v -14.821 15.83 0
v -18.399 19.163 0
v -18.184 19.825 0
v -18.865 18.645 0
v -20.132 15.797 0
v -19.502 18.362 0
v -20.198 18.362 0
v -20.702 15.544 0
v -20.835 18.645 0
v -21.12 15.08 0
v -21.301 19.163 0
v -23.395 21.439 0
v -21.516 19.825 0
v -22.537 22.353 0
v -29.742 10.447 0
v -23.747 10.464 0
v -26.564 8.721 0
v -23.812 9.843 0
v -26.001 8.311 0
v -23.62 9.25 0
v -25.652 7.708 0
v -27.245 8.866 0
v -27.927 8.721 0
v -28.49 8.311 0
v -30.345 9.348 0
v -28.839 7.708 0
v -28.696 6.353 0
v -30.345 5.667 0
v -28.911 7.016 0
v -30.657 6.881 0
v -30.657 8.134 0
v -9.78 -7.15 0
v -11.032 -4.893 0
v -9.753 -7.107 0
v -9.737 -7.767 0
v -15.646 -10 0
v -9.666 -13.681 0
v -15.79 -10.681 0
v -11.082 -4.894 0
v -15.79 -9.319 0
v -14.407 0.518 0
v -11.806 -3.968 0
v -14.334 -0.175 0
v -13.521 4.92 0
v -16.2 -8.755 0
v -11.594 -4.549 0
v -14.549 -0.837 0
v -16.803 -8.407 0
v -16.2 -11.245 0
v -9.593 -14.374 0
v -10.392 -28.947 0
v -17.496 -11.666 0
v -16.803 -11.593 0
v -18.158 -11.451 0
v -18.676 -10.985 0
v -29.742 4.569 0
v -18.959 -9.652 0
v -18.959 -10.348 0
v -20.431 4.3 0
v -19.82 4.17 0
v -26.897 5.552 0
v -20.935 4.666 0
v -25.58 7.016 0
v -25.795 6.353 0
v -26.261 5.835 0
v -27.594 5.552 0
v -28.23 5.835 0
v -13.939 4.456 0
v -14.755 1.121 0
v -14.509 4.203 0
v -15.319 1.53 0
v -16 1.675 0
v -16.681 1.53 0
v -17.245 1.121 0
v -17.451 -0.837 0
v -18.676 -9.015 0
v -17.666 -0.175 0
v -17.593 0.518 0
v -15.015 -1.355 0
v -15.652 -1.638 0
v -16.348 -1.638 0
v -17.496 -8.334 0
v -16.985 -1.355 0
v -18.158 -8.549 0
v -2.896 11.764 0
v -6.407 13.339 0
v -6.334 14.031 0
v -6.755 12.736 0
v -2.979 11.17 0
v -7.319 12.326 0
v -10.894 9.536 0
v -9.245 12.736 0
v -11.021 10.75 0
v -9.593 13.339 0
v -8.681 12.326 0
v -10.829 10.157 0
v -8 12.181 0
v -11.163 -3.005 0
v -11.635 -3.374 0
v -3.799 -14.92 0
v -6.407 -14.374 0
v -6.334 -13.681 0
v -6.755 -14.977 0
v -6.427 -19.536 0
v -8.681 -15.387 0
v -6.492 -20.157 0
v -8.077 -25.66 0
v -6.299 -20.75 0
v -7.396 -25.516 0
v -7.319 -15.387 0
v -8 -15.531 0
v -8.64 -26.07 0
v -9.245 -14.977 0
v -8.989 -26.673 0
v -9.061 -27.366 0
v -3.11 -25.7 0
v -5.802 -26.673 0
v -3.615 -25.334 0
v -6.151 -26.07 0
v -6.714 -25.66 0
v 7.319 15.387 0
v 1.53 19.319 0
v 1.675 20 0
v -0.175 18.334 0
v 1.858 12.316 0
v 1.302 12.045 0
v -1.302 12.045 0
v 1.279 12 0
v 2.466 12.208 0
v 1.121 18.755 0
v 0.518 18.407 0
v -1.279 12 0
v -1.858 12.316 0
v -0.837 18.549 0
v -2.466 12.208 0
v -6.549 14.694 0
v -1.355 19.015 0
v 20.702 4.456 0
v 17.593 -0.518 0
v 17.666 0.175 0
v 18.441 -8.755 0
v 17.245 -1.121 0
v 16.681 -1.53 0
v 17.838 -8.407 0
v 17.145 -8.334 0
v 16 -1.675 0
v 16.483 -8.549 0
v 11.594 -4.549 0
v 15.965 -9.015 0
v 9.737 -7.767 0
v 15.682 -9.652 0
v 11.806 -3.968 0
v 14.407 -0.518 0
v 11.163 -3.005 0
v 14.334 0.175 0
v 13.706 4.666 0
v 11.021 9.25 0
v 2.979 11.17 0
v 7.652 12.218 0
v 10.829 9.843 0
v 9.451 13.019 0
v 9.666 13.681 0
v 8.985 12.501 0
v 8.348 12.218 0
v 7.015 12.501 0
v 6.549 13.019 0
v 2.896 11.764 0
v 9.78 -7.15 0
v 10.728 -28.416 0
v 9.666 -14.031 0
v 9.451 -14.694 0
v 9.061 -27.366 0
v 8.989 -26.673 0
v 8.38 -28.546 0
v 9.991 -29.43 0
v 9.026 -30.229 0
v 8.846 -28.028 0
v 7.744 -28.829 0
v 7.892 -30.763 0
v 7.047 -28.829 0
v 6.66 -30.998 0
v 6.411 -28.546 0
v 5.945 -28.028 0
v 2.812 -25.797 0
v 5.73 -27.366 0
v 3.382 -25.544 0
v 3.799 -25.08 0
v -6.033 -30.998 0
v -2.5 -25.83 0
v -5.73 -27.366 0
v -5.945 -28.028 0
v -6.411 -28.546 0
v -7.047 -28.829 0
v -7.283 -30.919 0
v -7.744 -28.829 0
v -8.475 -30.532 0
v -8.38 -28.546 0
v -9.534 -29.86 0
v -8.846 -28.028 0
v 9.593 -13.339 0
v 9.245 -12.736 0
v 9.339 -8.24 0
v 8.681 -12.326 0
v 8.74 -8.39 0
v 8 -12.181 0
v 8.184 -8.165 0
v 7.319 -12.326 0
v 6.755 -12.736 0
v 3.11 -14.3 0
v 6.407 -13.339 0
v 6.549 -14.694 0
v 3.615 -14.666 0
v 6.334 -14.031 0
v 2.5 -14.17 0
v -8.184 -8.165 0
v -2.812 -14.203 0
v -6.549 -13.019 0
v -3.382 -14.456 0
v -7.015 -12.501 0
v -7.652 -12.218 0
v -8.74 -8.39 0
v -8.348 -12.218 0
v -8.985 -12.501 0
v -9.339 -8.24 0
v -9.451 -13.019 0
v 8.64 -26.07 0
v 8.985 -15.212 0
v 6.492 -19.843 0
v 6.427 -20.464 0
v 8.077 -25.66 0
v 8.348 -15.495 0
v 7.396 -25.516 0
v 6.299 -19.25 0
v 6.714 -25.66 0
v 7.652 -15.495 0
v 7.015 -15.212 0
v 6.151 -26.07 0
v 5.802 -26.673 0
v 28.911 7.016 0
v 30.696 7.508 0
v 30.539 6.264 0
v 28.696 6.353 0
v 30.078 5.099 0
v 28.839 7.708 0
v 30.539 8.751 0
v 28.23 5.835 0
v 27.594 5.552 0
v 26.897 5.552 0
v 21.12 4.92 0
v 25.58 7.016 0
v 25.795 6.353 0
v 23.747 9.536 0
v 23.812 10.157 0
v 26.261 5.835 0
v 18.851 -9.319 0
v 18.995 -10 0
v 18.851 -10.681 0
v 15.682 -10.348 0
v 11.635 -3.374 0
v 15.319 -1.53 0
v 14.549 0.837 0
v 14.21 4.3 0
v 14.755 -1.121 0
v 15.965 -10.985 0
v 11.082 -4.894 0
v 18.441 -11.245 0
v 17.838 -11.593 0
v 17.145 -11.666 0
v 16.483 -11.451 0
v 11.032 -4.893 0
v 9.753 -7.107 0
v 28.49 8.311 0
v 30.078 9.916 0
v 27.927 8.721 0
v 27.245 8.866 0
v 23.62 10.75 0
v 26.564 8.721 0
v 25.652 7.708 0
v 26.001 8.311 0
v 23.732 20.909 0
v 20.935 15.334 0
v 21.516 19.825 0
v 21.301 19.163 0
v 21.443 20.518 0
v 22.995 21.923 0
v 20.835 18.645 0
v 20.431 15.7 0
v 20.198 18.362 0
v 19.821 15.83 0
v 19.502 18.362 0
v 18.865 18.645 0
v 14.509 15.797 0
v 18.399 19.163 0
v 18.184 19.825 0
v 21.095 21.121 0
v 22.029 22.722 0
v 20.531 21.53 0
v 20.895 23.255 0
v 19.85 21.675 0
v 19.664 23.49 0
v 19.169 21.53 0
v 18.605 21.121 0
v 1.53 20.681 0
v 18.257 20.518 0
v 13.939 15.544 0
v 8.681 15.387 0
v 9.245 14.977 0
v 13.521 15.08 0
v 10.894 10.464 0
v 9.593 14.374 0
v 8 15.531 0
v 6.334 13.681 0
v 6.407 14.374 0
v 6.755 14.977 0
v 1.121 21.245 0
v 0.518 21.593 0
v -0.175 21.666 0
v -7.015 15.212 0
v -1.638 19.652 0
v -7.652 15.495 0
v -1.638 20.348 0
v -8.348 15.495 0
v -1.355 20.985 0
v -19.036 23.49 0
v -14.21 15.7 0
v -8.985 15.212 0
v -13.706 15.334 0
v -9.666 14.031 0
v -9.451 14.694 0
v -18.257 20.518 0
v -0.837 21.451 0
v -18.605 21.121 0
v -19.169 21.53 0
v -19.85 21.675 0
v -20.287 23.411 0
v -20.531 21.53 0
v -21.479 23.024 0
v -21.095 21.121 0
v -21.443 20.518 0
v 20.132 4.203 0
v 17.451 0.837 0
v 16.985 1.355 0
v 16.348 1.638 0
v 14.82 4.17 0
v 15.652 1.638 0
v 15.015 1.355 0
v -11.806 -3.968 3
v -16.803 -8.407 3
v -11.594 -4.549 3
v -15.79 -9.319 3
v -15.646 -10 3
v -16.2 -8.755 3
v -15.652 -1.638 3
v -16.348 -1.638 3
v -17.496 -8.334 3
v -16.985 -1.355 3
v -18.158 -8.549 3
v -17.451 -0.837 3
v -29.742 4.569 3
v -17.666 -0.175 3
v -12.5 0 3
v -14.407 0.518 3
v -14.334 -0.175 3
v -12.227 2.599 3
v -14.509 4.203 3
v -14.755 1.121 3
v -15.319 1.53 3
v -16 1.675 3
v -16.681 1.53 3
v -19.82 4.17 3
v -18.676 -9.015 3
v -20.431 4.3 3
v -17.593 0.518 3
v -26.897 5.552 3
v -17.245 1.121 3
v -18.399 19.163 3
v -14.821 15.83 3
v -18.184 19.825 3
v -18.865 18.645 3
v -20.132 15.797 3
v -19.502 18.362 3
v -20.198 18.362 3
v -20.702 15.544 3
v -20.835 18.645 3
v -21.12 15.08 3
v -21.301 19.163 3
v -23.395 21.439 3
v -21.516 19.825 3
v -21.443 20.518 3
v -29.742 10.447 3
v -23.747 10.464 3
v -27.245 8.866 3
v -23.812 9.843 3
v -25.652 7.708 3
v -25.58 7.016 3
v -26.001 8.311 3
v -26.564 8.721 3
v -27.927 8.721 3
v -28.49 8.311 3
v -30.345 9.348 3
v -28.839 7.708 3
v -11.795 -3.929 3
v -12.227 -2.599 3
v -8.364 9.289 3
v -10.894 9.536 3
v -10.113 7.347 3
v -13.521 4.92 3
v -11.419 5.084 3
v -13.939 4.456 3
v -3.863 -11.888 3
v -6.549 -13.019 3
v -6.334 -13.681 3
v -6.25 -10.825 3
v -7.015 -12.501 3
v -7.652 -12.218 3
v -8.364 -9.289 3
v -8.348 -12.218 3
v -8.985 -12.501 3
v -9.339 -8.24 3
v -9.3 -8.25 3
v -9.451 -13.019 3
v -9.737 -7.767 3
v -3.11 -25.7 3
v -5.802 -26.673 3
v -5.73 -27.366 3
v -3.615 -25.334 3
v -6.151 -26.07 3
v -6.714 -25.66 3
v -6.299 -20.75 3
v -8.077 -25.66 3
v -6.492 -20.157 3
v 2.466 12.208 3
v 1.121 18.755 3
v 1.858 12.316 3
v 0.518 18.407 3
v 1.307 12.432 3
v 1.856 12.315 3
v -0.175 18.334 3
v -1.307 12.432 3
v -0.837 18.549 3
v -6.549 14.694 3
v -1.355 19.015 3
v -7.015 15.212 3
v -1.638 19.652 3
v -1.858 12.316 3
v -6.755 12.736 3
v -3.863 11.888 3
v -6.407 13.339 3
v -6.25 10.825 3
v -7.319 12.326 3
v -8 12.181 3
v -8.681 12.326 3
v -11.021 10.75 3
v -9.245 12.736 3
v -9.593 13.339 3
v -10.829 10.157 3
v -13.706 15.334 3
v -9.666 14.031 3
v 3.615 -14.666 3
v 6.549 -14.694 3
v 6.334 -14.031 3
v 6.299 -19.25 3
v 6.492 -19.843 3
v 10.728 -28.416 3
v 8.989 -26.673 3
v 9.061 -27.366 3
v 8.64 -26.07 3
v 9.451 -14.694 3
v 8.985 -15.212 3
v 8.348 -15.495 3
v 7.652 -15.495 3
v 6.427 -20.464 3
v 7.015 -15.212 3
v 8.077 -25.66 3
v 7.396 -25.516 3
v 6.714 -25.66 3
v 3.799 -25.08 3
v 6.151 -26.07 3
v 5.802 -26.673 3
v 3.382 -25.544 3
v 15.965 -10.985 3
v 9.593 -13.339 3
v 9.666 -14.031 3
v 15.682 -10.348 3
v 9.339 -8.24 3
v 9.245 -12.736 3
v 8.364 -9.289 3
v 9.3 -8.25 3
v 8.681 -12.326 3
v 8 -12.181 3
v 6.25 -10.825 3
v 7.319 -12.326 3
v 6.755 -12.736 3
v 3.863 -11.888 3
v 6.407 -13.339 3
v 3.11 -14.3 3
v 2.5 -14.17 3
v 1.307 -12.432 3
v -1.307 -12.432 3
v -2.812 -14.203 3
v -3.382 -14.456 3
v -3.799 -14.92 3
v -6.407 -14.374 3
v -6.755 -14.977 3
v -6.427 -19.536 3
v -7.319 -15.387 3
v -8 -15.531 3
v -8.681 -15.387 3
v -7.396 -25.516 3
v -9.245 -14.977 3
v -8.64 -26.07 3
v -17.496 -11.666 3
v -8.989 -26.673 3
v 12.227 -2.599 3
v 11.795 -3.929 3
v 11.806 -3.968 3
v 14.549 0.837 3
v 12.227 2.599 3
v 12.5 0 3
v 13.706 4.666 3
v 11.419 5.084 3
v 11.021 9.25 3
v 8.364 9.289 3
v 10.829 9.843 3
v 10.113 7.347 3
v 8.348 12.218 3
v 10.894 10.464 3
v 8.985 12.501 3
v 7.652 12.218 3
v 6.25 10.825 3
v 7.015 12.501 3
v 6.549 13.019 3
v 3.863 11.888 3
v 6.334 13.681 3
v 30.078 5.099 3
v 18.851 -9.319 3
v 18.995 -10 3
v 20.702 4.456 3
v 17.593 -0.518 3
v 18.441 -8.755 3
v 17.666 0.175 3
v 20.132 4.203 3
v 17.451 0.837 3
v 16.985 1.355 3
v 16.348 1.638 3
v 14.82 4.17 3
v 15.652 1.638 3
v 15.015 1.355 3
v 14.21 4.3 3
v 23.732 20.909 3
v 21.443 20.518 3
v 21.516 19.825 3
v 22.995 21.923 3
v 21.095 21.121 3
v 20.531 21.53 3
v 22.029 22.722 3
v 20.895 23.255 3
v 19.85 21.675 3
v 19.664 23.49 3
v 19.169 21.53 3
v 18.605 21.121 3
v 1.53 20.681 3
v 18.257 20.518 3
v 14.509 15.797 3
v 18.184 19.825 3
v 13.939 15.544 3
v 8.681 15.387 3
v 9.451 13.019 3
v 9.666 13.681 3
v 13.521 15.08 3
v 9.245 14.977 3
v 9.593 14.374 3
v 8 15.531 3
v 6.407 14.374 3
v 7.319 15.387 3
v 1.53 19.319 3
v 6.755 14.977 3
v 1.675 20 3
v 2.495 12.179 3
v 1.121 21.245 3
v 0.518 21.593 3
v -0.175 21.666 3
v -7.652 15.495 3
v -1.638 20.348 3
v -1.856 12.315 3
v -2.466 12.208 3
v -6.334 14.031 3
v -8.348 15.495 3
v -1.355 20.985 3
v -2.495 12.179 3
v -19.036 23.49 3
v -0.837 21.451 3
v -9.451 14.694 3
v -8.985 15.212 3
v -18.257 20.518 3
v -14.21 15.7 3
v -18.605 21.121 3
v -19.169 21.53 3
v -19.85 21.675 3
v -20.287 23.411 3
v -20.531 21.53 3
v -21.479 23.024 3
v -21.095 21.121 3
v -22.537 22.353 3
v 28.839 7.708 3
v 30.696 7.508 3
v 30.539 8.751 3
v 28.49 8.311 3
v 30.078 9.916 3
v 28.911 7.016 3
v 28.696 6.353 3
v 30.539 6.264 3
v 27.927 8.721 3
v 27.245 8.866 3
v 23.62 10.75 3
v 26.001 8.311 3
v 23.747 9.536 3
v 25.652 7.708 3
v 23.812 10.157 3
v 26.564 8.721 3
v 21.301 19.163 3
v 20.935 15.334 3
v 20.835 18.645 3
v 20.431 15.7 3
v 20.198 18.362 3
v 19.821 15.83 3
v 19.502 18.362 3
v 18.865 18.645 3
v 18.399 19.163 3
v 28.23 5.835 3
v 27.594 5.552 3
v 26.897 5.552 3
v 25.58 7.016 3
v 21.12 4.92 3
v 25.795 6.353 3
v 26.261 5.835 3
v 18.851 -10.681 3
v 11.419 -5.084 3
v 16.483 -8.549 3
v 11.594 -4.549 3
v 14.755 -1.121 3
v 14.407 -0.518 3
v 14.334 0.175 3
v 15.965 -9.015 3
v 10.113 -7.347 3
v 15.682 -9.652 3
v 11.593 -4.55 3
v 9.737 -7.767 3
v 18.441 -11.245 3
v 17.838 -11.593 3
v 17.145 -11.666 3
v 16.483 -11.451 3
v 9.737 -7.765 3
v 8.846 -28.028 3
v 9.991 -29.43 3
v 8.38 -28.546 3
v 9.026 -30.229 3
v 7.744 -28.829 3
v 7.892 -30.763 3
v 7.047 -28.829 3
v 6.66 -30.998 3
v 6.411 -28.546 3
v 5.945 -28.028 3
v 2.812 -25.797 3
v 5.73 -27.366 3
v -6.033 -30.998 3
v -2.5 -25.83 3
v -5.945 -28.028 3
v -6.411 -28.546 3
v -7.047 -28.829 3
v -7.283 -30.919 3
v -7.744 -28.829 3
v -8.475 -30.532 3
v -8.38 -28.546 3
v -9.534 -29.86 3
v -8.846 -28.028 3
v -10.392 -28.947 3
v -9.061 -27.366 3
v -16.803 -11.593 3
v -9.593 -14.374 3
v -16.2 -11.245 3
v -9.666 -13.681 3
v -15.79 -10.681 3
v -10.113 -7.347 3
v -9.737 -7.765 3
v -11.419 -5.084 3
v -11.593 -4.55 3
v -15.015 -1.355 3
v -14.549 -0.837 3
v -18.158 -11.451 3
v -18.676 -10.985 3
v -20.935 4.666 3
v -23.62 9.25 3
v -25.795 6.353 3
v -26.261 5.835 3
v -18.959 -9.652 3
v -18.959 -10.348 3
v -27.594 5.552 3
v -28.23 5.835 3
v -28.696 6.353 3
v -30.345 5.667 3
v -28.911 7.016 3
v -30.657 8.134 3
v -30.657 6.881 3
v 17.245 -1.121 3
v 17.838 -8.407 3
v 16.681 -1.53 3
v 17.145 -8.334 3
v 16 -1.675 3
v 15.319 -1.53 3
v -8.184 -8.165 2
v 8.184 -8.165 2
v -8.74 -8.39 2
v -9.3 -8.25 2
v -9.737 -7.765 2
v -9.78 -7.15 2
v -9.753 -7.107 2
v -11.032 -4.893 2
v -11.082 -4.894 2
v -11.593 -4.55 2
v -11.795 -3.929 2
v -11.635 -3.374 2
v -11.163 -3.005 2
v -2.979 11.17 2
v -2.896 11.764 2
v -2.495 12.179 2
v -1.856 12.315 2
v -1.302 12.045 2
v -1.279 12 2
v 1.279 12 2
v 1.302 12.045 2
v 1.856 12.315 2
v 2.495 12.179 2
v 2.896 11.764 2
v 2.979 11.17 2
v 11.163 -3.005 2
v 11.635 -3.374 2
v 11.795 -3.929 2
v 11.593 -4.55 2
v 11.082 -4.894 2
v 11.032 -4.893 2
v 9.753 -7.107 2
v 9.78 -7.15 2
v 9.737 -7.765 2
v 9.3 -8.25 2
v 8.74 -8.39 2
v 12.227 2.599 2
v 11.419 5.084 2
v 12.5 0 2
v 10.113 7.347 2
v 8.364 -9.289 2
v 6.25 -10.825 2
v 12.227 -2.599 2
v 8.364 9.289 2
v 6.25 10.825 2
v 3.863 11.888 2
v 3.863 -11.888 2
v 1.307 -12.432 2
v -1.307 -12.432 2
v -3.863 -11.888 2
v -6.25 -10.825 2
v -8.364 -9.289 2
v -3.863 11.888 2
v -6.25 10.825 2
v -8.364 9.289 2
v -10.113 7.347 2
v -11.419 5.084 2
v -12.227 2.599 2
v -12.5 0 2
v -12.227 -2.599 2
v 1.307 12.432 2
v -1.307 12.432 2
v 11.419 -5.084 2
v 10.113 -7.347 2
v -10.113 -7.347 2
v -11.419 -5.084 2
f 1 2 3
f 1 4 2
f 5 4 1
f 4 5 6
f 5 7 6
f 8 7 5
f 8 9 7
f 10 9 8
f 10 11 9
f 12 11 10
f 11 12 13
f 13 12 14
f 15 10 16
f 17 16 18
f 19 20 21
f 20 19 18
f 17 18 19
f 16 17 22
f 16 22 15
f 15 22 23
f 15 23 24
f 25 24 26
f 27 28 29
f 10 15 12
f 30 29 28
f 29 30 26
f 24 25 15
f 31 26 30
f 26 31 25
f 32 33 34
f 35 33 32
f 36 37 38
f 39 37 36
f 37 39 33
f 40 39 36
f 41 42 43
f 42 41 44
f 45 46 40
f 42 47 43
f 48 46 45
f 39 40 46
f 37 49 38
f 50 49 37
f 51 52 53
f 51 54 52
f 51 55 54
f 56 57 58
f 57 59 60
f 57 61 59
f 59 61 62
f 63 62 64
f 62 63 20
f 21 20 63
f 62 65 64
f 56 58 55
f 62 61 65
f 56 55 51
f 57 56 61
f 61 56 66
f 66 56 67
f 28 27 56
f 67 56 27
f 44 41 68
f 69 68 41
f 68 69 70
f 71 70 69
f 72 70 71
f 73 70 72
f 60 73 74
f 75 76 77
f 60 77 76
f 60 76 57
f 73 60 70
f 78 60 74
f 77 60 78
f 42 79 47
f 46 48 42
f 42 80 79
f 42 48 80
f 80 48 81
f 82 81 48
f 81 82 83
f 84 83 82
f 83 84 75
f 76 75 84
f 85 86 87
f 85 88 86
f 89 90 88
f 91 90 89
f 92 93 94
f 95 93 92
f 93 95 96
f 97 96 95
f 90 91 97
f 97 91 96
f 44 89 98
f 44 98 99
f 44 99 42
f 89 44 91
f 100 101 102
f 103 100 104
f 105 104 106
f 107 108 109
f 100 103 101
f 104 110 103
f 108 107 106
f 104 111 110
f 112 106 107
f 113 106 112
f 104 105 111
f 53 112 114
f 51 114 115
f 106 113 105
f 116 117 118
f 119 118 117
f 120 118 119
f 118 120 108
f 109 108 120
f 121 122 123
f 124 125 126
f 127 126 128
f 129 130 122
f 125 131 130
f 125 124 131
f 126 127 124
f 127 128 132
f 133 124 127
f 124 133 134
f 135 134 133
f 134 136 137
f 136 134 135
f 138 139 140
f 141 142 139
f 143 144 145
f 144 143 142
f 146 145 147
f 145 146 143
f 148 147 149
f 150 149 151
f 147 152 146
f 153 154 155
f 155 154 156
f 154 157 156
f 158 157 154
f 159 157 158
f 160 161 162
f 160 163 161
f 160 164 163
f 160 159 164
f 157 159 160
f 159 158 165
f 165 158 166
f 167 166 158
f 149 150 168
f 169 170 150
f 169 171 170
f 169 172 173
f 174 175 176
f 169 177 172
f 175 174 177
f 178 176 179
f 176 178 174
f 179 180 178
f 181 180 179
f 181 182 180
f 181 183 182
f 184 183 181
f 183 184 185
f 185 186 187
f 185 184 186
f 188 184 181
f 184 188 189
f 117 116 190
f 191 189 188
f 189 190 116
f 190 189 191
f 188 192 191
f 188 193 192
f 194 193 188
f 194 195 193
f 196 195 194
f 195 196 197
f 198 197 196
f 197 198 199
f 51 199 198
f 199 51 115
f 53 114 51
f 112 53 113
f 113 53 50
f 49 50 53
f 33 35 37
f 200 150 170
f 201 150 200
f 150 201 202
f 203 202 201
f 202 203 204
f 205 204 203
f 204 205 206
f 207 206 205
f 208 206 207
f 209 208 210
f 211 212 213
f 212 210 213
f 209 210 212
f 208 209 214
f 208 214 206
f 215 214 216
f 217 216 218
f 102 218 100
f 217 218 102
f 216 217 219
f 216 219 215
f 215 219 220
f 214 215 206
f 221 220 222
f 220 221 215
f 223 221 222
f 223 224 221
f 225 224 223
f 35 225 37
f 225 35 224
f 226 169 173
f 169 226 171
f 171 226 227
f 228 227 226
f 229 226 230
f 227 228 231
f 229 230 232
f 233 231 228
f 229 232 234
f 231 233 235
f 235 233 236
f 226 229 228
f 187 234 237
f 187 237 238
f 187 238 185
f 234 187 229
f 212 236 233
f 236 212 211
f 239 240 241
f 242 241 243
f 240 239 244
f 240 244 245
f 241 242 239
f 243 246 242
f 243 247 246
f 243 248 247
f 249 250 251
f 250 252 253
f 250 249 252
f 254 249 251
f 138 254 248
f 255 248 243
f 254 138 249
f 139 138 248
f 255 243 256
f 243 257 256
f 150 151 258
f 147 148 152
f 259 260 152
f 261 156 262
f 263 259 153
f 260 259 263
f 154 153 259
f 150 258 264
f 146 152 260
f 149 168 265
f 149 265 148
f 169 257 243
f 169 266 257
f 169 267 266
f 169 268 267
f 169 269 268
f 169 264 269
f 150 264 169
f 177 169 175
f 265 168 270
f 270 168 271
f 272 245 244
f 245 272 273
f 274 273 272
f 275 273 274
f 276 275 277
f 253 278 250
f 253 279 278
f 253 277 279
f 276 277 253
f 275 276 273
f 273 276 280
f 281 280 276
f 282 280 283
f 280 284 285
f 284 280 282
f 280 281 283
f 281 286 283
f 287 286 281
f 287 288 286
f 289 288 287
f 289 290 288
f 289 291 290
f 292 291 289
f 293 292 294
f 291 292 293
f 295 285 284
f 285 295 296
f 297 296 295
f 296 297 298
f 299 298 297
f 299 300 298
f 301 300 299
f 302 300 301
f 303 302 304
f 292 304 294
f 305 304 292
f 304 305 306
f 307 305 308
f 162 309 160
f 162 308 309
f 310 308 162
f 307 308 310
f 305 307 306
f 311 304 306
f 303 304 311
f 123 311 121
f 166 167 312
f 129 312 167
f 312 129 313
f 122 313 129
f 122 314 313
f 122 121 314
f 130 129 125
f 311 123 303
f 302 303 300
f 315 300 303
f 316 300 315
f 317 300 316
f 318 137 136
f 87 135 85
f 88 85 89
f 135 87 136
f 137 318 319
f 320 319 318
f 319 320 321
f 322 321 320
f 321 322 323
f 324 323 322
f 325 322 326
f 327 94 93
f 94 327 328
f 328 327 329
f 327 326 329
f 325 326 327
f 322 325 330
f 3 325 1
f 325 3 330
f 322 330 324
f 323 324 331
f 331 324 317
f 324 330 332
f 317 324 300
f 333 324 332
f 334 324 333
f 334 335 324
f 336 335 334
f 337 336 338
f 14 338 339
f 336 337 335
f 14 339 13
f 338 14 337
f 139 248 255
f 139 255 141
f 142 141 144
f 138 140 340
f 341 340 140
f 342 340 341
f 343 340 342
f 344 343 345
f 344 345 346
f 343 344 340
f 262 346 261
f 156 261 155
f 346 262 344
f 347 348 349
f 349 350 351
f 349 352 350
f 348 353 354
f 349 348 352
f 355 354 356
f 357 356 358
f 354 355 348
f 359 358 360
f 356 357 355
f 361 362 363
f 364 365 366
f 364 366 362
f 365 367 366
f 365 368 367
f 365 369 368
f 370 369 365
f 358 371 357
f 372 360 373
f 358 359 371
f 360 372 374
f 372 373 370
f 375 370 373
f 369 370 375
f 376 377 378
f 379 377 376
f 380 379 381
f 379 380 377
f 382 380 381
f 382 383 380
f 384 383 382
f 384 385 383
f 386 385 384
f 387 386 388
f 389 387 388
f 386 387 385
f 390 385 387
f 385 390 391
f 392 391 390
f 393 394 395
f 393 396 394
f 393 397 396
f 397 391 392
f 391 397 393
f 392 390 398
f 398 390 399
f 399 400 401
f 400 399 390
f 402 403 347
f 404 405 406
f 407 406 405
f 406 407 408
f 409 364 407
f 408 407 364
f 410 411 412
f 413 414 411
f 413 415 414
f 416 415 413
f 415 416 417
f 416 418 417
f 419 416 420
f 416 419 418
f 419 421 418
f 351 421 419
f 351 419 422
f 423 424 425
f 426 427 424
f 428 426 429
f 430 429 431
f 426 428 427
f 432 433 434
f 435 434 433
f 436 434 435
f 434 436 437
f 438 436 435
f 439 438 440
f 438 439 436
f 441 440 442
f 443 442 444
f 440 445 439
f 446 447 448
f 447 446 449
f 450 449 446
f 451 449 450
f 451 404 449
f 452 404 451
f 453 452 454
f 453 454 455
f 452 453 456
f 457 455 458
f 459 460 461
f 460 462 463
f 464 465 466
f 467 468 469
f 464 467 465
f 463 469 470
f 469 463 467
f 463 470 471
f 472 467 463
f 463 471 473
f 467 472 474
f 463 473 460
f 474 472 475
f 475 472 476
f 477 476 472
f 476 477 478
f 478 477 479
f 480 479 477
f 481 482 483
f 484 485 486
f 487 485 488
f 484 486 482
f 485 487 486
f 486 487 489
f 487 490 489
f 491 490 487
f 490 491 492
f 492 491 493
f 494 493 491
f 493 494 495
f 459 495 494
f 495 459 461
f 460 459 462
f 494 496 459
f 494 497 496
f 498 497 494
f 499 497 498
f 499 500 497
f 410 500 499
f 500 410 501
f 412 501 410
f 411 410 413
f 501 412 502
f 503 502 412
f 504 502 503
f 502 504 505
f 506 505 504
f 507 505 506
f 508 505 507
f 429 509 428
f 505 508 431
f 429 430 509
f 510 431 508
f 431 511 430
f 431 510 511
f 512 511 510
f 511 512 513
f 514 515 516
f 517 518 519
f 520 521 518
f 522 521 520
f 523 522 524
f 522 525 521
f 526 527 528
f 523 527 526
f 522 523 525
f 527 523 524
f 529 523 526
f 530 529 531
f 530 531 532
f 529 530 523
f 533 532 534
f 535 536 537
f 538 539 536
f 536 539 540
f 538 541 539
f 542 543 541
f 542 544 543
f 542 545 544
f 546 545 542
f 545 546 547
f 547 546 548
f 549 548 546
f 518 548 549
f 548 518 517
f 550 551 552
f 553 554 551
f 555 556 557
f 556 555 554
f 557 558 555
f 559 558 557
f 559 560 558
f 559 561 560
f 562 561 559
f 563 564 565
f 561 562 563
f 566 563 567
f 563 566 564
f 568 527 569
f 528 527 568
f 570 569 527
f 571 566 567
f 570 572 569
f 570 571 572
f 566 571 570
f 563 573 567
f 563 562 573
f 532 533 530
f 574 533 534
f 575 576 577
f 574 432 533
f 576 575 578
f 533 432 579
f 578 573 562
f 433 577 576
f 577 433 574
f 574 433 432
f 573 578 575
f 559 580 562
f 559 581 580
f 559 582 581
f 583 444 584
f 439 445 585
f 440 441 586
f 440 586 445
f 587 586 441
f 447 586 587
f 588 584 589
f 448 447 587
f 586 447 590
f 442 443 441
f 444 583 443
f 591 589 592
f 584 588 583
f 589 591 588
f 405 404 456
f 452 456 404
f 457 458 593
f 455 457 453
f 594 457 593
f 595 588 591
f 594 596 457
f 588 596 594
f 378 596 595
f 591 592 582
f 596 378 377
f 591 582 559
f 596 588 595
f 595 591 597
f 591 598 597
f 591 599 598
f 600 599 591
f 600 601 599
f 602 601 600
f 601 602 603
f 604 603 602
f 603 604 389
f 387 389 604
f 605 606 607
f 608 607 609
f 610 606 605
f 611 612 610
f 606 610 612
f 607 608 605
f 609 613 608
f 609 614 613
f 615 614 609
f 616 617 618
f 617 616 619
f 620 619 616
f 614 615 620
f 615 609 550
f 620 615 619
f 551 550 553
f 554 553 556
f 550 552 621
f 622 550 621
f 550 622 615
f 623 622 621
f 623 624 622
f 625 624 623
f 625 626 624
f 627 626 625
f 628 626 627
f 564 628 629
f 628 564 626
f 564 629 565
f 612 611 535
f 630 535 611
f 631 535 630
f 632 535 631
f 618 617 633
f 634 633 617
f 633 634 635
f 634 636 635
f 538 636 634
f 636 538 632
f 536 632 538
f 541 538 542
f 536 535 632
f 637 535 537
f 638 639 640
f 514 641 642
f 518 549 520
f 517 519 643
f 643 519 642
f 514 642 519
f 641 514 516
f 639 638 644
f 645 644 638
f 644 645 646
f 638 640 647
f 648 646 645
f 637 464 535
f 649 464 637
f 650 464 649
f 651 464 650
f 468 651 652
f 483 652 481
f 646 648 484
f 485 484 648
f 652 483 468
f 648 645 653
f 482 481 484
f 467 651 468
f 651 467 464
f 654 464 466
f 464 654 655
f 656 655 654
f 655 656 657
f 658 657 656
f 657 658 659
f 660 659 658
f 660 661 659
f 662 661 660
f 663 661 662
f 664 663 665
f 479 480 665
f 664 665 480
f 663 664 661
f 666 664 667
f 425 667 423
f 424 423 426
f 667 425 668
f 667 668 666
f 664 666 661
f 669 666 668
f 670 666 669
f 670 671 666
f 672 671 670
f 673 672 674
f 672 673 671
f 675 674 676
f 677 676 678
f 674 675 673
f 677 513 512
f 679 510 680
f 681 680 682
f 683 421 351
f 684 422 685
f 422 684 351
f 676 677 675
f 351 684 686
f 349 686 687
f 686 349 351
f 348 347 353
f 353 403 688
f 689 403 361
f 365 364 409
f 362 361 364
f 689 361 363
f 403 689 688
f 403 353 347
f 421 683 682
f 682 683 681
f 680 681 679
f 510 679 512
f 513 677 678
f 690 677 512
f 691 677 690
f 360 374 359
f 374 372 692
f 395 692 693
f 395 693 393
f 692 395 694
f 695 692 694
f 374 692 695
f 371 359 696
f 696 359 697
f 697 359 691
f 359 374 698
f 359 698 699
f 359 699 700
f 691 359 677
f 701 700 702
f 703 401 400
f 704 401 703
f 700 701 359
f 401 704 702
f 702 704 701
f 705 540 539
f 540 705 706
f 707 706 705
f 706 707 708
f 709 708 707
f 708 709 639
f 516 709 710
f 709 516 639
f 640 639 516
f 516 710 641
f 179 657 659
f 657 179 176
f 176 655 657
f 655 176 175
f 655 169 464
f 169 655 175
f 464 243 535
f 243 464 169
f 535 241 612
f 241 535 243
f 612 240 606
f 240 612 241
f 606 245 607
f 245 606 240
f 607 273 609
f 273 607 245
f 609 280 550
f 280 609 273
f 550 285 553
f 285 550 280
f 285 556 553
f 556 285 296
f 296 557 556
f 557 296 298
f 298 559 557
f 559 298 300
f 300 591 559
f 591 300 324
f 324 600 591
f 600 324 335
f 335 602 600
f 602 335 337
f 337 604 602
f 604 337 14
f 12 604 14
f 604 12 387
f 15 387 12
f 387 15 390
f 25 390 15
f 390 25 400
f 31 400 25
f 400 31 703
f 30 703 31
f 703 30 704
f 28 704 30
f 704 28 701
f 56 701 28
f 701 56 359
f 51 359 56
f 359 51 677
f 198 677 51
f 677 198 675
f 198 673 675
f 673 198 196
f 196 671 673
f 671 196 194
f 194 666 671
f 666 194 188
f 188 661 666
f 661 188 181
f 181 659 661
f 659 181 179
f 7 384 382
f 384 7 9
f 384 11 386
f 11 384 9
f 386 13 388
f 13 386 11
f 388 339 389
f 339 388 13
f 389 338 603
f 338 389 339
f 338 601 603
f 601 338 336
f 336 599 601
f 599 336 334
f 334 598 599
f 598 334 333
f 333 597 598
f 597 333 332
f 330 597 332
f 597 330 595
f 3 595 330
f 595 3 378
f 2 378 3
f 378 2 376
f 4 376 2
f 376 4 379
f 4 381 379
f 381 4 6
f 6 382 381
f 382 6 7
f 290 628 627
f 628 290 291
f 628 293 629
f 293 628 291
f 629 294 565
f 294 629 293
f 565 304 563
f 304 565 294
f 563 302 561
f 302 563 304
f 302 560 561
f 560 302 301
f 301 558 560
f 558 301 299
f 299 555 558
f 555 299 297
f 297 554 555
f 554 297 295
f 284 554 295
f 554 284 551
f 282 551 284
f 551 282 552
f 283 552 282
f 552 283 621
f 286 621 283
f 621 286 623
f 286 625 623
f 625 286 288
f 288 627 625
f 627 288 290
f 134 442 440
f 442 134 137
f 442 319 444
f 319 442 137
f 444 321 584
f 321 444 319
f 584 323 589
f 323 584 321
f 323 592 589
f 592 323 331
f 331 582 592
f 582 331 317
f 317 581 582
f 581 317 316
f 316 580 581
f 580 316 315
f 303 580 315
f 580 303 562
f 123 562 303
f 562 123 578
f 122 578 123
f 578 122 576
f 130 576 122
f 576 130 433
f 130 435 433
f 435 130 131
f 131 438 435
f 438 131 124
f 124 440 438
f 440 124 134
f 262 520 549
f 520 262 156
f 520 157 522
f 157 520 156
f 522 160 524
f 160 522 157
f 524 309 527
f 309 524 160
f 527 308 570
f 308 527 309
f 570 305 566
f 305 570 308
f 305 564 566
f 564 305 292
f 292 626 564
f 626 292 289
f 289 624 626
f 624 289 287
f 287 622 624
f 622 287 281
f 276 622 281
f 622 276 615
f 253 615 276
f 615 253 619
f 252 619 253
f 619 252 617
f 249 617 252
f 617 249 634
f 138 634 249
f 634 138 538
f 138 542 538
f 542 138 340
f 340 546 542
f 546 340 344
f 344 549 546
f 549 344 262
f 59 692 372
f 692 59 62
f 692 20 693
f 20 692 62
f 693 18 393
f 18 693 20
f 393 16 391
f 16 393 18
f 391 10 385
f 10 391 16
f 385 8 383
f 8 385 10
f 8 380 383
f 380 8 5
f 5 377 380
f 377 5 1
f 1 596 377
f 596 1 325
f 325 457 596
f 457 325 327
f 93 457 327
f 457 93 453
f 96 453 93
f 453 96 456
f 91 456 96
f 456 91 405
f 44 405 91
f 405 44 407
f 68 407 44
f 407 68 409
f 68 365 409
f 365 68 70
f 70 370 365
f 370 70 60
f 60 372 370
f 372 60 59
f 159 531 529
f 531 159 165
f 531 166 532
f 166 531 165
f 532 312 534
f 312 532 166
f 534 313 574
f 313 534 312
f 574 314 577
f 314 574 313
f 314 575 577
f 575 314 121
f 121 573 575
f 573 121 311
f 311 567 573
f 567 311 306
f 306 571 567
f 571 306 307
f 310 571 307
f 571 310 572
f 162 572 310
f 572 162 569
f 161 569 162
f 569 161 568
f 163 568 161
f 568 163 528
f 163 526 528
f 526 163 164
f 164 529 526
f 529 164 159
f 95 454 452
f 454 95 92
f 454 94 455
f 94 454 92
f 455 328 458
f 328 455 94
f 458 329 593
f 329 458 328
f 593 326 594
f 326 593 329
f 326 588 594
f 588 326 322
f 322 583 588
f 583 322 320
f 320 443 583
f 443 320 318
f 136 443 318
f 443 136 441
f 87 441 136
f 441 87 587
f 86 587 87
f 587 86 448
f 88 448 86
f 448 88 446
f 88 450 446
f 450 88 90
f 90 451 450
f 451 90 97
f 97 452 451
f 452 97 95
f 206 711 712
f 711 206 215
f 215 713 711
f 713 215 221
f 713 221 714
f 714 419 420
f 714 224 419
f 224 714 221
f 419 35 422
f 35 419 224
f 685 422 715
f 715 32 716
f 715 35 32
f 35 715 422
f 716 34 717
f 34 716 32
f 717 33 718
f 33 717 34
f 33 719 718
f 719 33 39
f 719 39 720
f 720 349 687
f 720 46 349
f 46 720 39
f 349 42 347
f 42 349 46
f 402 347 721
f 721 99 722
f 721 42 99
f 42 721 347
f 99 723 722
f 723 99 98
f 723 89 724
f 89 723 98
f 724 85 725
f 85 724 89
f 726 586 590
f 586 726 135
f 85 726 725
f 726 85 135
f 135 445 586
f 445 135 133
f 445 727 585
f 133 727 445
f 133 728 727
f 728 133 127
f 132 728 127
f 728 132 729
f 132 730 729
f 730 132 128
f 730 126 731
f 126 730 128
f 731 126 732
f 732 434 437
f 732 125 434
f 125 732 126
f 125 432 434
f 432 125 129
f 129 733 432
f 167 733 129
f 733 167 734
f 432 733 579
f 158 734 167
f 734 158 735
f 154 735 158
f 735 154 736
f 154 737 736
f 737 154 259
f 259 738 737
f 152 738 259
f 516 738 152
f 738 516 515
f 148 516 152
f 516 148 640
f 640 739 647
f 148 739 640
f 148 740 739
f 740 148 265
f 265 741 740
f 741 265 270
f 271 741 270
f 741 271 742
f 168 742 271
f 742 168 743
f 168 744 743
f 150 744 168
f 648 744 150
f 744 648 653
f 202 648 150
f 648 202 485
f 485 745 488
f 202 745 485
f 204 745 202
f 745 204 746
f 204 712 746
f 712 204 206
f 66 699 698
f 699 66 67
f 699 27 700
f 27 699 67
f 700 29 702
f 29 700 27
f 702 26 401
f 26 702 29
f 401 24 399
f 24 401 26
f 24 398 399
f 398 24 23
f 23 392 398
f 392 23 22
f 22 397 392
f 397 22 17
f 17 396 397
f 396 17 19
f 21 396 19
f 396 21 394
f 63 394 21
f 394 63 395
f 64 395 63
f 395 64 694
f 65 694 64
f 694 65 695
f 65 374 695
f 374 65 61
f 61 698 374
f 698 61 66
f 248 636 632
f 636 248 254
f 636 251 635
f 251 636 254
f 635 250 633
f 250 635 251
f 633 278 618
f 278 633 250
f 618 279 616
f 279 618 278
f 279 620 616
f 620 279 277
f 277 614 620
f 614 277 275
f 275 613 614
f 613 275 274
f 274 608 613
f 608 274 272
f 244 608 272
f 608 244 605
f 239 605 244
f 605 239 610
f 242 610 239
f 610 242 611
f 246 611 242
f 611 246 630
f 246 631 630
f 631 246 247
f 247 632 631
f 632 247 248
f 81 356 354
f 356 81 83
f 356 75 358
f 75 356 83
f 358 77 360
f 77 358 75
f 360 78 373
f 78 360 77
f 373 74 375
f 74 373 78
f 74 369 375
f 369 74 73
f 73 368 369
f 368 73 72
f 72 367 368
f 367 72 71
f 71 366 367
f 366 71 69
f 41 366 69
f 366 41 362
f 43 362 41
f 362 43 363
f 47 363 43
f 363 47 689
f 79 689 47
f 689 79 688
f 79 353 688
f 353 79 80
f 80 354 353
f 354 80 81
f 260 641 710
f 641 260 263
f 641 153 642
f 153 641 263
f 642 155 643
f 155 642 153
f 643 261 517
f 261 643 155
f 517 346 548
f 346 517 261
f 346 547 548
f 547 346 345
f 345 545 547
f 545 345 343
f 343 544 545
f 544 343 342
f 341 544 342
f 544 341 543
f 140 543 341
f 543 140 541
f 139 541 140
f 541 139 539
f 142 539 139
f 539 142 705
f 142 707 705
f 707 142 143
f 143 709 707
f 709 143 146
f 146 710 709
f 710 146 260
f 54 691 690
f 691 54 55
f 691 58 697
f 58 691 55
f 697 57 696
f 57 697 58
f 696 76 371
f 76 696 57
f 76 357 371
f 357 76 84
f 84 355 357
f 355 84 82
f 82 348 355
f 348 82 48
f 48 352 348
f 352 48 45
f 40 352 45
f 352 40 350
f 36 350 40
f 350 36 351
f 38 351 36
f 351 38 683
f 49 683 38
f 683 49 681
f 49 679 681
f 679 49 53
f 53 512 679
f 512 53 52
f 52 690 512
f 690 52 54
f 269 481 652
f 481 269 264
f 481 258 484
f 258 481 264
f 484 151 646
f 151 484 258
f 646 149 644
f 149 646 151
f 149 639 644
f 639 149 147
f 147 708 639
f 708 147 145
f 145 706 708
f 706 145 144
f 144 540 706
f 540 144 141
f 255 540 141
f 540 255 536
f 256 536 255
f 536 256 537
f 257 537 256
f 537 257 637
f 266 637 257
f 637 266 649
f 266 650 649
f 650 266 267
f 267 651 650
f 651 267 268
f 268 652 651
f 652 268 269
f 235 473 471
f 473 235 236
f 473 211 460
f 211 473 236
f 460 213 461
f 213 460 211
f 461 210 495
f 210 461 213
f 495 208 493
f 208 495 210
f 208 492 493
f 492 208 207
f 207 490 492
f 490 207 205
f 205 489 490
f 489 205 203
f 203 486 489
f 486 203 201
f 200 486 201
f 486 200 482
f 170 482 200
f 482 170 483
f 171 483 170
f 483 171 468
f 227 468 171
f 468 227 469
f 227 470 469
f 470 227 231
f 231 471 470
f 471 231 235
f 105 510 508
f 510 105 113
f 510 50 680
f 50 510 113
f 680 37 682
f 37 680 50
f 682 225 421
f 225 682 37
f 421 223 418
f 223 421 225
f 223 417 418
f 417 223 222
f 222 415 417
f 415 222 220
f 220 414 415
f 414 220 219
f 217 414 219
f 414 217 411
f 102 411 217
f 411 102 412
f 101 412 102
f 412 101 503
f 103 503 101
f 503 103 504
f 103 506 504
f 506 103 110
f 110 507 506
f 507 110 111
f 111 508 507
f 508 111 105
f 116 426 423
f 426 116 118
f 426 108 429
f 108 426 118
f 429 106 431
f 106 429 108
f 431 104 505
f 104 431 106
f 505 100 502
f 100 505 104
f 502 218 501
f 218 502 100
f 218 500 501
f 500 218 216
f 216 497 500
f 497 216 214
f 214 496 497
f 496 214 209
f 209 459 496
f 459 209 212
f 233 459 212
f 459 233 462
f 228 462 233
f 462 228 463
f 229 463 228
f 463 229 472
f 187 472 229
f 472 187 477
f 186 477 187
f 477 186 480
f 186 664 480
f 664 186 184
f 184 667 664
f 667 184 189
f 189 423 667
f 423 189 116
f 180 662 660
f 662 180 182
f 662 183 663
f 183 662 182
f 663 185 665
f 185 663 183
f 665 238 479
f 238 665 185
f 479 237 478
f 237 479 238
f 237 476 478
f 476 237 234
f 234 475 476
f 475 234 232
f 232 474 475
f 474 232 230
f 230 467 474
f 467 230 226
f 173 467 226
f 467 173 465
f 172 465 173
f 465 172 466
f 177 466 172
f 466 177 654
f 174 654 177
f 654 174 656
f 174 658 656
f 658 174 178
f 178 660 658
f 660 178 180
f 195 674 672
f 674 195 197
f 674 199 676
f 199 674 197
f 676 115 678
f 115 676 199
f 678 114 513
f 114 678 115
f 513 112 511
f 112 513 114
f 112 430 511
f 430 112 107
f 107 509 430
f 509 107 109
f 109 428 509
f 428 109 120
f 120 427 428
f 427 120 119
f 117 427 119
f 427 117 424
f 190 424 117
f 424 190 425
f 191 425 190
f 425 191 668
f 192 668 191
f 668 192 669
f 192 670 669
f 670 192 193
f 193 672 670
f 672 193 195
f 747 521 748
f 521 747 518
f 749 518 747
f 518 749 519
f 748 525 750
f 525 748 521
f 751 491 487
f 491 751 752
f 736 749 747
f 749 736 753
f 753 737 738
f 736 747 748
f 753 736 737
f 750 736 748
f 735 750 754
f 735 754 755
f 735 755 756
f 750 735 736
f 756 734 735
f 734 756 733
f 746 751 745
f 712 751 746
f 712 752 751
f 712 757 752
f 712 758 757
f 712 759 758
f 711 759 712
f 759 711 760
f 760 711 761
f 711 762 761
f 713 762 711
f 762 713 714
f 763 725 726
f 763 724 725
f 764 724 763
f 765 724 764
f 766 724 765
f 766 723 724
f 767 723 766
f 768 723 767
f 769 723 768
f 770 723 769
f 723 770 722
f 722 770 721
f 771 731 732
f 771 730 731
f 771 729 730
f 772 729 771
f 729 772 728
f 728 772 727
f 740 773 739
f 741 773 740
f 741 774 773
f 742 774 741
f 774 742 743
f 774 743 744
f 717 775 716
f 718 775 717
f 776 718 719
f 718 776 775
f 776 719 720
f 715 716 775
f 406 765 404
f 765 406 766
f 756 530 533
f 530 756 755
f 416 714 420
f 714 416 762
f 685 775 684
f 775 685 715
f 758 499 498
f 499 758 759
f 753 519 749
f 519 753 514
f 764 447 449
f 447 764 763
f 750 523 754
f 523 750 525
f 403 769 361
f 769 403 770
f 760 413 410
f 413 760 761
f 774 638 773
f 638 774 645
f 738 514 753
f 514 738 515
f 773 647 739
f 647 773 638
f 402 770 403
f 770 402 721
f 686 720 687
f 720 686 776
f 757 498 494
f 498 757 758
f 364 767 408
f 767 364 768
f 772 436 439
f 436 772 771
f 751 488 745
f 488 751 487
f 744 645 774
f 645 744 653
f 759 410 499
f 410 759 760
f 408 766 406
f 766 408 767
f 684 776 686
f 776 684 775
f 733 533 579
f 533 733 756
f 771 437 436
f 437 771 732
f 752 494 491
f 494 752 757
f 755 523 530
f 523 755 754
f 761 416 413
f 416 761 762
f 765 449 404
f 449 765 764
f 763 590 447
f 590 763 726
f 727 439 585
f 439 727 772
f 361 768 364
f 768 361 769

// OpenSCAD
// file: configuration_v3.scad
// Increase this if your slicer or printer make holes too tight.
extra_radius = 0.05;

// OD = outside diameter, corner to corner.
m3_nut_od = 6.1;
m3_nut_radius = m3_nut_od/2 + 0.2 + extra_radius;
m3_washer_radius = 3.5 + extra_radius;

// Major diameter of metric 3mm thread.
m3_major = 2.85;
m3_radius = m3_major/2 + extra_radius;
m3_wide_radius = m3_major/2 + extra_radius + 0.2;

// NEMA17 stepper motors.
motor_shaft_diameter = 5;
motor_shaft_radius = motor_shaft_diameter/2 + extra_radius;

// Frame brackets. M3x8mm screws work best with 3.6 mm brackets.
thickness = 3.6;

// OpenBeam or Misumi. Currently only 15x15 mm, but there is a plan
// to make models more parametric and allow 20x20 mm in the future.
extrusion = 15;

// Placement for the NEMA17 stepper motors.
motor_offset = 44;
motor_length = 47;
// main file
include <configuration_v3.scad>;

separation      = 39.7;  // Distance between ball joint mounting faces.
offset          = 20;  // Same as DELTA_EFFECTOR_OFFSET in Marlin.
mount_radius    = 16;  // Hotend mounting screws, standard would be 25mm.
thickness       = 3;
smidge          = 0.1;

module mountHole() {

    union() {
        
        hull()
        for (a = [90:120:360]) 
        rotate([0, 0, a])
        translate([11.5, 0, 0])
        square([1, 5], center=true);
     
        for (a = [10:120:360]) {
            rotate([0, 0, a]) {
                translate([0, 11.5, 0])
                circle(r=1, center=true, $fn=10);
            }
            rotate([0, 0, a-20]) {
                translate([0, 11.5, 0])
                circle(r=1, center=true, $fn=10);
            }
        }
    }
}


module hexagonHole() {
    hull(){
        for (a = [30:60:360]) {
            rotate([0, 0, a]) {
                translate([0, 5, 0])
                circle(r=1.5, center=true, $fn=15);
            }
        }
    }
}    
    

module effector_2d() {
    
    difference() {
        // basic effector shape
        minkowski() {
            hull()
            for (a = [60:120:360]) {
                rotate([0, 0, a+30])
                translate([offset-6, 0, 0])
                square([9, separation-1],center=true);
            }

            circle(r=5, $fn=25);
        }

        // cut out the mount hole for hot-end 
        mountHole();

        // cut out holes for magnetics balls
        for (a = [60:120:360]) {
            rotate([0, 0, a+30])
            translate([offset, 0, 0]) {
                
                translate([0, separation/2, 0])
                circle(r=m3_wide_radius, center=true, $fn=15);

                translate([0, -separation/2, 0])
                circle(r=m3_wide_radius, center=true, $fn=15);
            }
        }
        
        // cut out holes for PolyStroooder mount clamp
        for (a = [30:60:360]) {
            rotate([0, 0, a]) {
                translate([0, mount_radius, 0])
                circle(r=m3_wide_radius, center=true, $fn=15);
            }
        }

        // cut out holes for mounting fans and other stuff
        for (a = [0:120:360]) {
            rotate([0, 0, a]) {
                translate([0, offset, 0])
                circle(r=m3_wide_radius, center=true, $fn=15);
            }
        }

        // cut out hexagon holes for cable management
        for (a = [60:120:360]) {
            rotate([0, 0, a]) {
                translate([0, offset, 0])
                hexagonHole();
            }
        }
    }
    

}


module effector_3d() {
    difference() {
        translate([0,0,0])
        linear_extrude(height=thickness, center=false, convexity=10)
        effector_2d();
        
        // cut out space for hot end
        translate([0,0,2])
        cylinder(r=12.5, height=1+smidge);
    }
}
    

// generate the effector
translate([0,0,0])
effector_3d();
